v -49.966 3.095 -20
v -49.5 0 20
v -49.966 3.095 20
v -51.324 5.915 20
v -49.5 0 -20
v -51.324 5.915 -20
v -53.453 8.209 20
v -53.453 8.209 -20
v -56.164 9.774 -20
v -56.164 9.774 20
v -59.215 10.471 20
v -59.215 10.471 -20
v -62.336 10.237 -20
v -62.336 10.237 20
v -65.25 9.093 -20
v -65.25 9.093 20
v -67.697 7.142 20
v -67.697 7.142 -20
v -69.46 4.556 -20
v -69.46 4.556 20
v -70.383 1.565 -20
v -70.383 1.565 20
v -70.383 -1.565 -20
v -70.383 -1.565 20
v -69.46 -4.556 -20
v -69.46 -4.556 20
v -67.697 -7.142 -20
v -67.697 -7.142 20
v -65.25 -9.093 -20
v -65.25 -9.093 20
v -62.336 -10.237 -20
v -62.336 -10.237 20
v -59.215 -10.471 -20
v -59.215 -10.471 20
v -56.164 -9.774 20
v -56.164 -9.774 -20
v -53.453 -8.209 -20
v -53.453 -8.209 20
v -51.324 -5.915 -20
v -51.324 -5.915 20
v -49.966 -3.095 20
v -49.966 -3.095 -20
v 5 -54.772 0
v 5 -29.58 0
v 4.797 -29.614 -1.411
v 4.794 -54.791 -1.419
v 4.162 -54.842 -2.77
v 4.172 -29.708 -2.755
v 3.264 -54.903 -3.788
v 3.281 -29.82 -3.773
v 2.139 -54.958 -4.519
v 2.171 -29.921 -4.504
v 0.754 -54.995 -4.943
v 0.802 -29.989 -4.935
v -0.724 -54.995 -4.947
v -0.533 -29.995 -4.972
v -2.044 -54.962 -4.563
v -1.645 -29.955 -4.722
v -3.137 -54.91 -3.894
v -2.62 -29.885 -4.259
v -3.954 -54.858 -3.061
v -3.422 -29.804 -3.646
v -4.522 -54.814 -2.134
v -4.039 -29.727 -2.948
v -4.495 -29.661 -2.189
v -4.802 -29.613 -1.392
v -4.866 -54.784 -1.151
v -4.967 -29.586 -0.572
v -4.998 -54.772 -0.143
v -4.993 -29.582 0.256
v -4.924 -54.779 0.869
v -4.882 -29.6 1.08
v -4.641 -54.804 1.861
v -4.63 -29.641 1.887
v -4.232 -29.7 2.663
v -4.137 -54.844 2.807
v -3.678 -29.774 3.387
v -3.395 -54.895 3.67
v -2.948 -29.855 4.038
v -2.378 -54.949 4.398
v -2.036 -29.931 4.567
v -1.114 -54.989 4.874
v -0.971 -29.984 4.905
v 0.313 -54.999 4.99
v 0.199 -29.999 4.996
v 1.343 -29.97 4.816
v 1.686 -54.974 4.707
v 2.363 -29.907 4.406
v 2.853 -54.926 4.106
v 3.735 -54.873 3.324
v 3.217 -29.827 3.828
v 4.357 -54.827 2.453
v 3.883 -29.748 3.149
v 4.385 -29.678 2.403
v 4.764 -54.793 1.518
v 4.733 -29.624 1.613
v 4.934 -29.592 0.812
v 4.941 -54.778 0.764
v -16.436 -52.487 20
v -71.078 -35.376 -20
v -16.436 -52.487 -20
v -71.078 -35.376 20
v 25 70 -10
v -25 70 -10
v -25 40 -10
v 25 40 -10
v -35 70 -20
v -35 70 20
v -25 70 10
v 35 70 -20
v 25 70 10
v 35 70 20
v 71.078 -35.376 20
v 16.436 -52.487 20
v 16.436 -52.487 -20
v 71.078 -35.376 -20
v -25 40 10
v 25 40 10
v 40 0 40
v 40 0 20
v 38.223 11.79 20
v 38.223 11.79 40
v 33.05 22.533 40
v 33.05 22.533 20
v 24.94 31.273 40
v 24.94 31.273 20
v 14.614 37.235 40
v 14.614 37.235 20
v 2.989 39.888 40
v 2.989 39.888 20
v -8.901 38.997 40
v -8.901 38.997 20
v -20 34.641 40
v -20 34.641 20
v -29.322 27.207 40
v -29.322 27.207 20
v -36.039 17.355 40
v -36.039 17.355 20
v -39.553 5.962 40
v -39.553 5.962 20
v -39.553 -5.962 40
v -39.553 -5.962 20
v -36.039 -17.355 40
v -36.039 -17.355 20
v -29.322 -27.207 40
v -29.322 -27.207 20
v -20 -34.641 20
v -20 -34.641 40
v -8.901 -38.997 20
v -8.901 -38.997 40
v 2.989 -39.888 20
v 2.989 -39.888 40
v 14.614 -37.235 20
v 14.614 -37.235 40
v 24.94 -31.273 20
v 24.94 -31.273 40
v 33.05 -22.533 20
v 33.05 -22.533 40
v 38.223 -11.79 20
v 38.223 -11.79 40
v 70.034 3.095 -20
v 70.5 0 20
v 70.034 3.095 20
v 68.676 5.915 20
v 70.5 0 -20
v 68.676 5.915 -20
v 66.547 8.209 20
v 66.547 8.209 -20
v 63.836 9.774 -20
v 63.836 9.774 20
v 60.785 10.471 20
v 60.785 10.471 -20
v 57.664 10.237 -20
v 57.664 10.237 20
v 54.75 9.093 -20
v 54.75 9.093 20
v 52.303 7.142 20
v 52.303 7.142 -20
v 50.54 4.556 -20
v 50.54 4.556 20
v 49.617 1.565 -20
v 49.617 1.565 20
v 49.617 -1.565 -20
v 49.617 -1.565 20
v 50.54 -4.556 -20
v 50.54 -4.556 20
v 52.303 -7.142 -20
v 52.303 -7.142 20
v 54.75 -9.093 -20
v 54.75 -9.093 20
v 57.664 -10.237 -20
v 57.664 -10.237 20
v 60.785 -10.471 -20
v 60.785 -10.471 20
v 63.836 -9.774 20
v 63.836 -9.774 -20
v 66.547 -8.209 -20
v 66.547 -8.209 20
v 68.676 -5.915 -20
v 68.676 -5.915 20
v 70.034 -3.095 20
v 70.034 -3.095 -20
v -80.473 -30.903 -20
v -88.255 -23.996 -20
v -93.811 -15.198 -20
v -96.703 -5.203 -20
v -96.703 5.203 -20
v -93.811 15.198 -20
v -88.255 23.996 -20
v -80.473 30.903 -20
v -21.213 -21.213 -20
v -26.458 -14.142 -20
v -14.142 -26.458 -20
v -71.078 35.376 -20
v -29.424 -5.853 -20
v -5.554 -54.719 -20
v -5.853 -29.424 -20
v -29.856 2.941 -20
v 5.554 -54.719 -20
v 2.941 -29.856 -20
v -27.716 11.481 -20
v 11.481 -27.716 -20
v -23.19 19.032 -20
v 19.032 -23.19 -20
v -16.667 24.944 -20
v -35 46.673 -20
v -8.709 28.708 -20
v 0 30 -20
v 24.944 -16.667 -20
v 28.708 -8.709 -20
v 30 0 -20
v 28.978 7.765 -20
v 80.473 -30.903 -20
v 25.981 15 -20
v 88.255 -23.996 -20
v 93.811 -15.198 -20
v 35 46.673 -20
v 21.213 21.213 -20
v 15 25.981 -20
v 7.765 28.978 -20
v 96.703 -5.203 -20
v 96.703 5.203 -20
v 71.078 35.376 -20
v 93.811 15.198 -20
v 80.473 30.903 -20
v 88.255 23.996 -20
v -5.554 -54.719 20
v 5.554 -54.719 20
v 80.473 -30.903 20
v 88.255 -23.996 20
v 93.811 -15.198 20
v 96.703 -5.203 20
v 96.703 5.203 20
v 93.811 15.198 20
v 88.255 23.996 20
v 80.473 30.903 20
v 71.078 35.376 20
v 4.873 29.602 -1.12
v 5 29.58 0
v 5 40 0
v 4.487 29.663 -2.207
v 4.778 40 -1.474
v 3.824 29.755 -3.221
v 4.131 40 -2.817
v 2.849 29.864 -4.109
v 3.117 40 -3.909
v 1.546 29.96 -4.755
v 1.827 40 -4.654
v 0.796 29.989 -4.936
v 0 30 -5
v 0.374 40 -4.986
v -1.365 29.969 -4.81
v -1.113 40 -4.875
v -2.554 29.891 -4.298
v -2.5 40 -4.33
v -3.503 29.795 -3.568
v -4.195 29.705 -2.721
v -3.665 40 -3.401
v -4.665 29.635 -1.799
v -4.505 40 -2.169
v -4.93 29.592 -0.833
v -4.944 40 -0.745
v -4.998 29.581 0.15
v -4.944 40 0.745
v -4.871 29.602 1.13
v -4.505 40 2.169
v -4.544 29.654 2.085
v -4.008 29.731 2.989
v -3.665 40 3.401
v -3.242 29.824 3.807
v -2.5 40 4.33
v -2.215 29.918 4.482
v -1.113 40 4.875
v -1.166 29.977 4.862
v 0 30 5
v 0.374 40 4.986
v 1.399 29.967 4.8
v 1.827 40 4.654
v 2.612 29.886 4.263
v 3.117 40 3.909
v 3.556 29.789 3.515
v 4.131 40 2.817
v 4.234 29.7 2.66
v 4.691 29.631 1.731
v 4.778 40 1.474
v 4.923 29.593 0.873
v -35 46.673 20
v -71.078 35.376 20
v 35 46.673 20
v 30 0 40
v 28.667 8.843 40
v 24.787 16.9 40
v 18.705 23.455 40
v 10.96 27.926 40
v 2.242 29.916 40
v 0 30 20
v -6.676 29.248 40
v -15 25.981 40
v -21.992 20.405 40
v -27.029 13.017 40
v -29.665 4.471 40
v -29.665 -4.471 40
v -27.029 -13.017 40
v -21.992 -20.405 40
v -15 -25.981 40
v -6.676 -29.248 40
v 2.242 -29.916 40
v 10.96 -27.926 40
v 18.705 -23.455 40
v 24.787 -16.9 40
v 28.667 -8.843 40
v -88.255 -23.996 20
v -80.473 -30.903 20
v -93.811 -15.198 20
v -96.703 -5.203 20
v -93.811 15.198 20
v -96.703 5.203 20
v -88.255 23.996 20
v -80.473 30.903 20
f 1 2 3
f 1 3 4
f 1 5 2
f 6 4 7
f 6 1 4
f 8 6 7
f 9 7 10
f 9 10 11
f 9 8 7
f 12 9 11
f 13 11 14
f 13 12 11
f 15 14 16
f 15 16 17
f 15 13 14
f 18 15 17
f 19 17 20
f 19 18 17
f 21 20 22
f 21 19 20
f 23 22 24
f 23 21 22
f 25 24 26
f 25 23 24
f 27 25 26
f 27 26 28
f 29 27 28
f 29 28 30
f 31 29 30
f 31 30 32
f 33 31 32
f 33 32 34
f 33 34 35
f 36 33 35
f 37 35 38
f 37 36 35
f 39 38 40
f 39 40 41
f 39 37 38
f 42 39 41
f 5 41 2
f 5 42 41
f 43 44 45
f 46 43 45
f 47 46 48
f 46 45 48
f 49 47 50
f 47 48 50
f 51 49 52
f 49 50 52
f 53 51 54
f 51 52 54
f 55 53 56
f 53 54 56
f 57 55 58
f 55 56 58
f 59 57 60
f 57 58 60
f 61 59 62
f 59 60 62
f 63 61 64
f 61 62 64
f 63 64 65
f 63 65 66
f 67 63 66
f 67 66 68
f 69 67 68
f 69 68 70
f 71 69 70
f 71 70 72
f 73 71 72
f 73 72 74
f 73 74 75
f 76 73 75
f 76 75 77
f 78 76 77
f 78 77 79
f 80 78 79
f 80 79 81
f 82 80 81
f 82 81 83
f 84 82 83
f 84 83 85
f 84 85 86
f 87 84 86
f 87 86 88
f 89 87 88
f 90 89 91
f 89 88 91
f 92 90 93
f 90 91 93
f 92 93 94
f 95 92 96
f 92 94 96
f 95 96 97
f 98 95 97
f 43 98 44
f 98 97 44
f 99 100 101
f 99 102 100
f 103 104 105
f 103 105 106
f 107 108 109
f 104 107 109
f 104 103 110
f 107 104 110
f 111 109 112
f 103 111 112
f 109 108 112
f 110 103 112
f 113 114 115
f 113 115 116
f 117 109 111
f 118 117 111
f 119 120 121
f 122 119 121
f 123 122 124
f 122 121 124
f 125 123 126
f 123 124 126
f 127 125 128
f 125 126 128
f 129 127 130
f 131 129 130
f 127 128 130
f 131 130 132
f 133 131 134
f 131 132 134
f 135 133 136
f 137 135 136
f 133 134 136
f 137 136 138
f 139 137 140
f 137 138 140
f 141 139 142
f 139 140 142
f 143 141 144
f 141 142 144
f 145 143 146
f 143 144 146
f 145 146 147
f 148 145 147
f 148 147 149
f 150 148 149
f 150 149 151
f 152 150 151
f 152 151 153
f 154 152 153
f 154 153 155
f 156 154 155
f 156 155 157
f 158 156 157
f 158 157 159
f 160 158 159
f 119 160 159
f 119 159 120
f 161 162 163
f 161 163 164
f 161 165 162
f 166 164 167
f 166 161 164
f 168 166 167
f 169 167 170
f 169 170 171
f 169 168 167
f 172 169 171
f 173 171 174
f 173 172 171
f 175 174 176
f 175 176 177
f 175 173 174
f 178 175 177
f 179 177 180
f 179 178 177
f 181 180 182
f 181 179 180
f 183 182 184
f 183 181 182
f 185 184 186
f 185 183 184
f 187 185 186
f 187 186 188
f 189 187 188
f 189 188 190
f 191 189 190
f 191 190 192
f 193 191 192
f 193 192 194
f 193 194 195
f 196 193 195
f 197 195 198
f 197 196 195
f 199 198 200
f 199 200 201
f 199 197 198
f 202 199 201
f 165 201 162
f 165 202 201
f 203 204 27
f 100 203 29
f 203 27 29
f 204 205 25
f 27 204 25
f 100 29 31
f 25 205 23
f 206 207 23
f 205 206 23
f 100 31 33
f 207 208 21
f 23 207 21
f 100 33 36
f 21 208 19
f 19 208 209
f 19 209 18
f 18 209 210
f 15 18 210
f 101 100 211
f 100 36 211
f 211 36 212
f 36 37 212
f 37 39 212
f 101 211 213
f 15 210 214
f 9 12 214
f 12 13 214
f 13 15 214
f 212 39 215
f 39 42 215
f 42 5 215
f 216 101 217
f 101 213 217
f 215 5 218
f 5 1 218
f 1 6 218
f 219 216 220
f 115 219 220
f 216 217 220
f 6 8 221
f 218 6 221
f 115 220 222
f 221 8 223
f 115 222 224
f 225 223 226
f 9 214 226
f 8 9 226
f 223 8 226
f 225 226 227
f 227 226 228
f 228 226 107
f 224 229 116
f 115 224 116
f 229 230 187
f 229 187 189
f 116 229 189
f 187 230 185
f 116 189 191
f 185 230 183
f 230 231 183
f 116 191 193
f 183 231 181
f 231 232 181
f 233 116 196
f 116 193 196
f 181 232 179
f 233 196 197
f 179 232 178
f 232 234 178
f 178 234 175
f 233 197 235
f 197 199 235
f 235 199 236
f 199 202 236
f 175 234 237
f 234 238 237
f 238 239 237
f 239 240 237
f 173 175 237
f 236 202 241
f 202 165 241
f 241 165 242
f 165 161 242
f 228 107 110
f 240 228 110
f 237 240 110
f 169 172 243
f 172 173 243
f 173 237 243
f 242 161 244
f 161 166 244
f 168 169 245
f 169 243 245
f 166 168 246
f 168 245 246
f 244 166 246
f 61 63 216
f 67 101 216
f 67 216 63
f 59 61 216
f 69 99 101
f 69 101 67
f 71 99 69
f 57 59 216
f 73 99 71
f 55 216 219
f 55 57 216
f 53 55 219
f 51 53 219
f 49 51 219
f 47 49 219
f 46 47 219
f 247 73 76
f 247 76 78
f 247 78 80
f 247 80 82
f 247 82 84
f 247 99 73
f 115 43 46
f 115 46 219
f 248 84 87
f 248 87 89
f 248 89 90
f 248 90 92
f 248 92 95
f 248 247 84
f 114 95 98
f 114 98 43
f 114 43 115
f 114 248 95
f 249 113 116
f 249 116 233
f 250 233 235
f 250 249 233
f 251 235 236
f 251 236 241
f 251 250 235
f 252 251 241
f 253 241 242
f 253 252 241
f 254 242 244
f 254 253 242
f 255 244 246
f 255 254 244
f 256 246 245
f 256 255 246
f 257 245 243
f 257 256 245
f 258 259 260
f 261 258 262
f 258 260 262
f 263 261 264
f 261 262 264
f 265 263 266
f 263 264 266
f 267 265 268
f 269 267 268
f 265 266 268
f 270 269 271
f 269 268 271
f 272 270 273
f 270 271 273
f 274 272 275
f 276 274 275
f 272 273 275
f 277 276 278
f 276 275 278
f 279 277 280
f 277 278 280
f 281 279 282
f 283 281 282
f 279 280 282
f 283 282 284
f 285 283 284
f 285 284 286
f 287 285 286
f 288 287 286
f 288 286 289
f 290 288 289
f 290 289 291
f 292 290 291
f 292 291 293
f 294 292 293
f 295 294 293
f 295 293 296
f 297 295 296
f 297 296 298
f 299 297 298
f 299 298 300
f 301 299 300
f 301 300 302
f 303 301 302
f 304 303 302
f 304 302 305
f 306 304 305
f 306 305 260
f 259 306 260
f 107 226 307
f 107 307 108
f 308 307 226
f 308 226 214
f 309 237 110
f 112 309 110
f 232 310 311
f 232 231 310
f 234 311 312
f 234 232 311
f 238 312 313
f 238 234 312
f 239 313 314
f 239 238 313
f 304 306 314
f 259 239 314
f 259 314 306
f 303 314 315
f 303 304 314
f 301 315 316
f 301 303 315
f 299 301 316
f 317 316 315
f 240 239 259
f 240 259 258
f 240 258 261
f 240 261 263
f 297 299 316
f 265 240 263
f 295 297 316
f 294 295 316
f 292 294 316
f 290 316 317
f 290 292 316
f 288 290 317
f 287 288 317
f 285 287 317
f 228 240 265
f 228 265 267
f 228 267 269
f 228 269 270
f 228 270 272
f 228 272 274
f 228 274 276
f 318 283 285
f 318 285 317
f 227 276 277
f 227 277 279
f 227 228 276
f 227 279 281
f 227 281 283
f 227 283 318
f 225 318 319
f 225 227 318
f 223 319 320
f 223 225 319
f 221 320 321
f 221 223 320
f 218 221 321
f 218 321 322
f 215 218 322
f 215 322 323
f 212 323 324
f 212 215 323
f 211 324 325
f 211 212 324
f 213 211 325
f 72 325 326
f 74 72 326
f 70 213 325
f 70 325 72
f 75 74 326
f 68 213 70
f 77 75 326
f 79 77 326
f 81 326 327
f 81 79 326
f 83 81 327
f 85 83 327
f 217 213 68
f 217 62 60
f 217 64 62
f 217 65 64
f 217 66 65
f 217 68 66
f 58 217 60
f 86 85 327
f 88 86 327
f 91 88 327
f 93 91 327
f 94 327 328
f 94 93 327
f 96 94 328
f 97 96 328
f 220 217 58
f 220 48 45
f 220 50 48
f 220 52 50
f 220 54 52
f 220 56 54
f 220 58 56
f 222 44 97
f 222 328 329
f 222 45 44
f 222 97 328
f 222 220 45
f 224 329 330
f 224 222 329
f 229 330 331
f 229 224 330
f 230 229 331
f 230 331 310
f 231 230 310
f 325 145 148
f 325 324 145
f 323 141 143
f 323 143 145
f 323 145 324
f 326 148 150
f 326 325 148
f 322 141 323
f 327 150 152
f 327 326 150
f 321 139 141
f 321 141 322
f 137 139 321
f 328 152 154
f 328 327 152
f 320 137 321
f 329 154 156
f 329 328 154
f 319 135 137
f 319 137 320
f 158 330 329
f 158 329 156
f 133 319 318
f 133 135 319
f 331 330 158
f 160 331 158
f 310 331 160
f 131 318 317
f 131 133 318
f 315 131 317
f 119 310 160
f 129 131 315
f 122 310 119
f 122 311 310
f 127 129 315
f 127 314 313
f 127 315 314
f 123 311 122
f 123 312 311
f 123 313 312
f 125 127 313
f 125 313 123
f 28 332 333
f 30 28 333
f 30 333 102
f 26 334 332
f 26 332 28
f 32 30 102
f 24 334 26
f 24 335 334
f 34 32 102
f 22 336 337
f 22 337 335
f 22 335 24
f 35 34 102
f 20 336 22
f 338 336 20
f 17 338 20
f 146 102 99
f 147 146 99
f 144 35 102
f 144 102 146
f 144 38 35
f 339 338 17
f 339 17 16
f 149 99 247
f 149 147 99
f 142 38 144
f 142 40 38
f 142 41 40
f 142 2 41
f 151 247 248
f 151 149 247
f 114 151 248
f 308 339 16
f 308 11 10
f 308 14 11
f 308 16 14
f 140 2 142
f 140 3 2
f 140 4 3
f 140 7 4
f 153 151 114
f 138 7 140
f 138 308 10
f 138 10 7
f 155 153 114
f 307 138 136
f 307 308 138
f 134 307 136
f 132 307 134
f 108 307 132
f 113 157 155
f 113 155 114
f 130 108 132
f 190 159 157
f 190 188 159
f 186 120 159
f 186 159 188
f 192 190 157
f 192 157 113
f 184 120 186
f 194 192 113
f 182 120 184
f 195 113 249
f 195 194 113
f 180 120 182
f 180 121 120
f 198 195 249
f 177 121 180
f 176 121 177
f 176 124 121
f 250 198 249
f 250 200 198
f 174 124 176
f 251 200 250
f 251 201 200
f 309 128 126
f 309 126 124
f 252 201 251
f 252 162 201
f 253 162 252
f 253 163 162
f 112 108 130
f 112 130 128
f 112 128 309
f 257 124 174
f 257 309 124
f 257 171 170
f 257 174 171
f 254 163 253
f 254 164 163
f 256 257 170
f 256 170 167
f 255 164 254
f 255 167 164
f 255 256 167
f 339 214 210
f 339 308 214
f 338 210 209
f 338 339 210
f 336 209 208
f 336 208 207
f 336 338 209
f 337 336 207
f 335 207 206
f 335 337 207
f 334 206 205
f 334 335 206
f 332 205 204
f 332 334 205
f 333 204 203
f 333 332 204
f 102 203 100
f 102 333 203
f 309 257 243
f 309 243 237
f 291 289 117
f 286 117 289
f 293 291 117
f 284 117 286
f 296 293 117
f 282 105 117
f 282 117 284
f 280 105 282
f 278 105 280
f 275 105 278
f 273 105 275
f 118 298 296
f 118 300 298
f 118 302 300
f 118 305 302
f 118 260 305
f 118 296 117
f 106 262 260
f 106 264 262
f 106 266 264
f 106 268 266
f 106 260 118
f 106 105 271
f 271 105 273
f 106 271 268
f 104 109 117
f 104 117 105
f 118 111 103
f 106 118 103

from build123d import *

# Parameters (mm, degrees)
IZIM1_R                     = 10.5
IZIM1_R_2                   = 40
IZIM1_R_3                   = 30
Y_KSEKLIK_EKSTR_ZYON1_DEPTH = 20
IZIM3_R                     = 40
IZIM3_R_2                   = 30
Y_KSEKLIK_EKSTR_ZYON2_DEPTH = 20
IZIM4_W                     = 70
IZIM4_H                     = 40
Y_KSEKLIK_EKSTR_ZYON3_DEPTH = 40
IZIM6_W                     = 50
IZIM6_H                     = 20
KES_EKSTR_ZYON4_DEPTH       = 30
IZIM8_R                     = 5
KES_EKSTR_ZYON5_DEPTH       = 96


with BuildPart() as part:
    # Çizim1 → Yükseklik-Ekstrüzyon1 (new body, symmetric)
    with BuildSketch(Plane.XY):
        with BuildLine():
            Line((-71.077917778, -35.375500425), (-16.436310678, -52.48664298))
            ThreePointArc((-16.436310678, -52.48664298), (0, -55), (16.436310678, -52.48664298))
            Line((16.436310678, -52.48664298), (71.077917778, -35.375500425))
            ThreePointArc((71.077917778, -35.375500425), (97.06947926, 0), (71.077917778, 35.375500425))
            Line((71.077917778, 35.375500425), (16.436310678, 52.48664298))
            ThreePointArc((16.436310678, 52.48664298), (0, 55), (-16.436310678, 52.48664298))
            Line((-16.436310678, 52.48664298), (-71.077917778, 35.375500425))
            ThreePointArc((-71.077917778, 35.375500425), (-97.06947926, 0), (-71.077917778, -35.375500425))
        make_face()
        with Locations((-60, 0)):
            Circle(IZIM1_R, mode=Mode.SUBTRACT)
        with Locations((60, 0)):
            Circle(IZIM1_R, mode=Mode.SUBTRACT)
        Circle(IZIM1_R_2, mode=Mode.SUBTRACT)
        Circle(IZIM1_R_2)
        Circle(IZIM1_R_3, mode=Mode.SUBTRACT)
    extrude(amount=Y_KSEKLIK_EKSTR_ZYON1_DEPTH, both=True)

    # Çizim3 → Yükseklik-Ekstrüzyon2 (add)
    with BuildSketch(Plane.XY.offset(20)):
        Circle(IZIM3_R)
        Circle(IZIM3_R_2, mode=Mode.SUBTRACT)
    extrude(amount=Y_KSEKLIK_EKSTR_ZYON2_DEPTH)

    # Çizim4 → Yükseklik-Ekstrüzyon3 (add)
    with BuildSketch(Plane.XY.offset(20)):
        with Locations((0, 50)):
            Rectangle(IZIM4_W, IZIM4_H)
    extrude(amount=-Y_KSEKLIK_EKSTR_ZYON3_DEPTH)

    # Çizim6 → Kes-Ekstrüzyon4 (cut)
    with BuildSketch(Plane(origin=(0, 70, 0), x_dir=(1, 0, 0), z_dir=(0, 1, 0))):
        Rectangle(IZIM6_W, IZIM6_H)
    extrude(amount=-KES_EKSTR_ZYON4_DEPTH, mode=Mode.SUBTRACT)

    # Çizim8 → Kes-Ekstrüzyon5 (cut, through all)
    with BuildSketch(Plane(origin=(0, 40, 0), x_dir=(1, 0, 0), z_dir=(0, 1, 0))):
        Circle(IZIM8_R)
    extrude(amount=-KES_EKSTR_ZYON5_DEPTH, mode=Mode.SUBTRACT)


solid = part.part
